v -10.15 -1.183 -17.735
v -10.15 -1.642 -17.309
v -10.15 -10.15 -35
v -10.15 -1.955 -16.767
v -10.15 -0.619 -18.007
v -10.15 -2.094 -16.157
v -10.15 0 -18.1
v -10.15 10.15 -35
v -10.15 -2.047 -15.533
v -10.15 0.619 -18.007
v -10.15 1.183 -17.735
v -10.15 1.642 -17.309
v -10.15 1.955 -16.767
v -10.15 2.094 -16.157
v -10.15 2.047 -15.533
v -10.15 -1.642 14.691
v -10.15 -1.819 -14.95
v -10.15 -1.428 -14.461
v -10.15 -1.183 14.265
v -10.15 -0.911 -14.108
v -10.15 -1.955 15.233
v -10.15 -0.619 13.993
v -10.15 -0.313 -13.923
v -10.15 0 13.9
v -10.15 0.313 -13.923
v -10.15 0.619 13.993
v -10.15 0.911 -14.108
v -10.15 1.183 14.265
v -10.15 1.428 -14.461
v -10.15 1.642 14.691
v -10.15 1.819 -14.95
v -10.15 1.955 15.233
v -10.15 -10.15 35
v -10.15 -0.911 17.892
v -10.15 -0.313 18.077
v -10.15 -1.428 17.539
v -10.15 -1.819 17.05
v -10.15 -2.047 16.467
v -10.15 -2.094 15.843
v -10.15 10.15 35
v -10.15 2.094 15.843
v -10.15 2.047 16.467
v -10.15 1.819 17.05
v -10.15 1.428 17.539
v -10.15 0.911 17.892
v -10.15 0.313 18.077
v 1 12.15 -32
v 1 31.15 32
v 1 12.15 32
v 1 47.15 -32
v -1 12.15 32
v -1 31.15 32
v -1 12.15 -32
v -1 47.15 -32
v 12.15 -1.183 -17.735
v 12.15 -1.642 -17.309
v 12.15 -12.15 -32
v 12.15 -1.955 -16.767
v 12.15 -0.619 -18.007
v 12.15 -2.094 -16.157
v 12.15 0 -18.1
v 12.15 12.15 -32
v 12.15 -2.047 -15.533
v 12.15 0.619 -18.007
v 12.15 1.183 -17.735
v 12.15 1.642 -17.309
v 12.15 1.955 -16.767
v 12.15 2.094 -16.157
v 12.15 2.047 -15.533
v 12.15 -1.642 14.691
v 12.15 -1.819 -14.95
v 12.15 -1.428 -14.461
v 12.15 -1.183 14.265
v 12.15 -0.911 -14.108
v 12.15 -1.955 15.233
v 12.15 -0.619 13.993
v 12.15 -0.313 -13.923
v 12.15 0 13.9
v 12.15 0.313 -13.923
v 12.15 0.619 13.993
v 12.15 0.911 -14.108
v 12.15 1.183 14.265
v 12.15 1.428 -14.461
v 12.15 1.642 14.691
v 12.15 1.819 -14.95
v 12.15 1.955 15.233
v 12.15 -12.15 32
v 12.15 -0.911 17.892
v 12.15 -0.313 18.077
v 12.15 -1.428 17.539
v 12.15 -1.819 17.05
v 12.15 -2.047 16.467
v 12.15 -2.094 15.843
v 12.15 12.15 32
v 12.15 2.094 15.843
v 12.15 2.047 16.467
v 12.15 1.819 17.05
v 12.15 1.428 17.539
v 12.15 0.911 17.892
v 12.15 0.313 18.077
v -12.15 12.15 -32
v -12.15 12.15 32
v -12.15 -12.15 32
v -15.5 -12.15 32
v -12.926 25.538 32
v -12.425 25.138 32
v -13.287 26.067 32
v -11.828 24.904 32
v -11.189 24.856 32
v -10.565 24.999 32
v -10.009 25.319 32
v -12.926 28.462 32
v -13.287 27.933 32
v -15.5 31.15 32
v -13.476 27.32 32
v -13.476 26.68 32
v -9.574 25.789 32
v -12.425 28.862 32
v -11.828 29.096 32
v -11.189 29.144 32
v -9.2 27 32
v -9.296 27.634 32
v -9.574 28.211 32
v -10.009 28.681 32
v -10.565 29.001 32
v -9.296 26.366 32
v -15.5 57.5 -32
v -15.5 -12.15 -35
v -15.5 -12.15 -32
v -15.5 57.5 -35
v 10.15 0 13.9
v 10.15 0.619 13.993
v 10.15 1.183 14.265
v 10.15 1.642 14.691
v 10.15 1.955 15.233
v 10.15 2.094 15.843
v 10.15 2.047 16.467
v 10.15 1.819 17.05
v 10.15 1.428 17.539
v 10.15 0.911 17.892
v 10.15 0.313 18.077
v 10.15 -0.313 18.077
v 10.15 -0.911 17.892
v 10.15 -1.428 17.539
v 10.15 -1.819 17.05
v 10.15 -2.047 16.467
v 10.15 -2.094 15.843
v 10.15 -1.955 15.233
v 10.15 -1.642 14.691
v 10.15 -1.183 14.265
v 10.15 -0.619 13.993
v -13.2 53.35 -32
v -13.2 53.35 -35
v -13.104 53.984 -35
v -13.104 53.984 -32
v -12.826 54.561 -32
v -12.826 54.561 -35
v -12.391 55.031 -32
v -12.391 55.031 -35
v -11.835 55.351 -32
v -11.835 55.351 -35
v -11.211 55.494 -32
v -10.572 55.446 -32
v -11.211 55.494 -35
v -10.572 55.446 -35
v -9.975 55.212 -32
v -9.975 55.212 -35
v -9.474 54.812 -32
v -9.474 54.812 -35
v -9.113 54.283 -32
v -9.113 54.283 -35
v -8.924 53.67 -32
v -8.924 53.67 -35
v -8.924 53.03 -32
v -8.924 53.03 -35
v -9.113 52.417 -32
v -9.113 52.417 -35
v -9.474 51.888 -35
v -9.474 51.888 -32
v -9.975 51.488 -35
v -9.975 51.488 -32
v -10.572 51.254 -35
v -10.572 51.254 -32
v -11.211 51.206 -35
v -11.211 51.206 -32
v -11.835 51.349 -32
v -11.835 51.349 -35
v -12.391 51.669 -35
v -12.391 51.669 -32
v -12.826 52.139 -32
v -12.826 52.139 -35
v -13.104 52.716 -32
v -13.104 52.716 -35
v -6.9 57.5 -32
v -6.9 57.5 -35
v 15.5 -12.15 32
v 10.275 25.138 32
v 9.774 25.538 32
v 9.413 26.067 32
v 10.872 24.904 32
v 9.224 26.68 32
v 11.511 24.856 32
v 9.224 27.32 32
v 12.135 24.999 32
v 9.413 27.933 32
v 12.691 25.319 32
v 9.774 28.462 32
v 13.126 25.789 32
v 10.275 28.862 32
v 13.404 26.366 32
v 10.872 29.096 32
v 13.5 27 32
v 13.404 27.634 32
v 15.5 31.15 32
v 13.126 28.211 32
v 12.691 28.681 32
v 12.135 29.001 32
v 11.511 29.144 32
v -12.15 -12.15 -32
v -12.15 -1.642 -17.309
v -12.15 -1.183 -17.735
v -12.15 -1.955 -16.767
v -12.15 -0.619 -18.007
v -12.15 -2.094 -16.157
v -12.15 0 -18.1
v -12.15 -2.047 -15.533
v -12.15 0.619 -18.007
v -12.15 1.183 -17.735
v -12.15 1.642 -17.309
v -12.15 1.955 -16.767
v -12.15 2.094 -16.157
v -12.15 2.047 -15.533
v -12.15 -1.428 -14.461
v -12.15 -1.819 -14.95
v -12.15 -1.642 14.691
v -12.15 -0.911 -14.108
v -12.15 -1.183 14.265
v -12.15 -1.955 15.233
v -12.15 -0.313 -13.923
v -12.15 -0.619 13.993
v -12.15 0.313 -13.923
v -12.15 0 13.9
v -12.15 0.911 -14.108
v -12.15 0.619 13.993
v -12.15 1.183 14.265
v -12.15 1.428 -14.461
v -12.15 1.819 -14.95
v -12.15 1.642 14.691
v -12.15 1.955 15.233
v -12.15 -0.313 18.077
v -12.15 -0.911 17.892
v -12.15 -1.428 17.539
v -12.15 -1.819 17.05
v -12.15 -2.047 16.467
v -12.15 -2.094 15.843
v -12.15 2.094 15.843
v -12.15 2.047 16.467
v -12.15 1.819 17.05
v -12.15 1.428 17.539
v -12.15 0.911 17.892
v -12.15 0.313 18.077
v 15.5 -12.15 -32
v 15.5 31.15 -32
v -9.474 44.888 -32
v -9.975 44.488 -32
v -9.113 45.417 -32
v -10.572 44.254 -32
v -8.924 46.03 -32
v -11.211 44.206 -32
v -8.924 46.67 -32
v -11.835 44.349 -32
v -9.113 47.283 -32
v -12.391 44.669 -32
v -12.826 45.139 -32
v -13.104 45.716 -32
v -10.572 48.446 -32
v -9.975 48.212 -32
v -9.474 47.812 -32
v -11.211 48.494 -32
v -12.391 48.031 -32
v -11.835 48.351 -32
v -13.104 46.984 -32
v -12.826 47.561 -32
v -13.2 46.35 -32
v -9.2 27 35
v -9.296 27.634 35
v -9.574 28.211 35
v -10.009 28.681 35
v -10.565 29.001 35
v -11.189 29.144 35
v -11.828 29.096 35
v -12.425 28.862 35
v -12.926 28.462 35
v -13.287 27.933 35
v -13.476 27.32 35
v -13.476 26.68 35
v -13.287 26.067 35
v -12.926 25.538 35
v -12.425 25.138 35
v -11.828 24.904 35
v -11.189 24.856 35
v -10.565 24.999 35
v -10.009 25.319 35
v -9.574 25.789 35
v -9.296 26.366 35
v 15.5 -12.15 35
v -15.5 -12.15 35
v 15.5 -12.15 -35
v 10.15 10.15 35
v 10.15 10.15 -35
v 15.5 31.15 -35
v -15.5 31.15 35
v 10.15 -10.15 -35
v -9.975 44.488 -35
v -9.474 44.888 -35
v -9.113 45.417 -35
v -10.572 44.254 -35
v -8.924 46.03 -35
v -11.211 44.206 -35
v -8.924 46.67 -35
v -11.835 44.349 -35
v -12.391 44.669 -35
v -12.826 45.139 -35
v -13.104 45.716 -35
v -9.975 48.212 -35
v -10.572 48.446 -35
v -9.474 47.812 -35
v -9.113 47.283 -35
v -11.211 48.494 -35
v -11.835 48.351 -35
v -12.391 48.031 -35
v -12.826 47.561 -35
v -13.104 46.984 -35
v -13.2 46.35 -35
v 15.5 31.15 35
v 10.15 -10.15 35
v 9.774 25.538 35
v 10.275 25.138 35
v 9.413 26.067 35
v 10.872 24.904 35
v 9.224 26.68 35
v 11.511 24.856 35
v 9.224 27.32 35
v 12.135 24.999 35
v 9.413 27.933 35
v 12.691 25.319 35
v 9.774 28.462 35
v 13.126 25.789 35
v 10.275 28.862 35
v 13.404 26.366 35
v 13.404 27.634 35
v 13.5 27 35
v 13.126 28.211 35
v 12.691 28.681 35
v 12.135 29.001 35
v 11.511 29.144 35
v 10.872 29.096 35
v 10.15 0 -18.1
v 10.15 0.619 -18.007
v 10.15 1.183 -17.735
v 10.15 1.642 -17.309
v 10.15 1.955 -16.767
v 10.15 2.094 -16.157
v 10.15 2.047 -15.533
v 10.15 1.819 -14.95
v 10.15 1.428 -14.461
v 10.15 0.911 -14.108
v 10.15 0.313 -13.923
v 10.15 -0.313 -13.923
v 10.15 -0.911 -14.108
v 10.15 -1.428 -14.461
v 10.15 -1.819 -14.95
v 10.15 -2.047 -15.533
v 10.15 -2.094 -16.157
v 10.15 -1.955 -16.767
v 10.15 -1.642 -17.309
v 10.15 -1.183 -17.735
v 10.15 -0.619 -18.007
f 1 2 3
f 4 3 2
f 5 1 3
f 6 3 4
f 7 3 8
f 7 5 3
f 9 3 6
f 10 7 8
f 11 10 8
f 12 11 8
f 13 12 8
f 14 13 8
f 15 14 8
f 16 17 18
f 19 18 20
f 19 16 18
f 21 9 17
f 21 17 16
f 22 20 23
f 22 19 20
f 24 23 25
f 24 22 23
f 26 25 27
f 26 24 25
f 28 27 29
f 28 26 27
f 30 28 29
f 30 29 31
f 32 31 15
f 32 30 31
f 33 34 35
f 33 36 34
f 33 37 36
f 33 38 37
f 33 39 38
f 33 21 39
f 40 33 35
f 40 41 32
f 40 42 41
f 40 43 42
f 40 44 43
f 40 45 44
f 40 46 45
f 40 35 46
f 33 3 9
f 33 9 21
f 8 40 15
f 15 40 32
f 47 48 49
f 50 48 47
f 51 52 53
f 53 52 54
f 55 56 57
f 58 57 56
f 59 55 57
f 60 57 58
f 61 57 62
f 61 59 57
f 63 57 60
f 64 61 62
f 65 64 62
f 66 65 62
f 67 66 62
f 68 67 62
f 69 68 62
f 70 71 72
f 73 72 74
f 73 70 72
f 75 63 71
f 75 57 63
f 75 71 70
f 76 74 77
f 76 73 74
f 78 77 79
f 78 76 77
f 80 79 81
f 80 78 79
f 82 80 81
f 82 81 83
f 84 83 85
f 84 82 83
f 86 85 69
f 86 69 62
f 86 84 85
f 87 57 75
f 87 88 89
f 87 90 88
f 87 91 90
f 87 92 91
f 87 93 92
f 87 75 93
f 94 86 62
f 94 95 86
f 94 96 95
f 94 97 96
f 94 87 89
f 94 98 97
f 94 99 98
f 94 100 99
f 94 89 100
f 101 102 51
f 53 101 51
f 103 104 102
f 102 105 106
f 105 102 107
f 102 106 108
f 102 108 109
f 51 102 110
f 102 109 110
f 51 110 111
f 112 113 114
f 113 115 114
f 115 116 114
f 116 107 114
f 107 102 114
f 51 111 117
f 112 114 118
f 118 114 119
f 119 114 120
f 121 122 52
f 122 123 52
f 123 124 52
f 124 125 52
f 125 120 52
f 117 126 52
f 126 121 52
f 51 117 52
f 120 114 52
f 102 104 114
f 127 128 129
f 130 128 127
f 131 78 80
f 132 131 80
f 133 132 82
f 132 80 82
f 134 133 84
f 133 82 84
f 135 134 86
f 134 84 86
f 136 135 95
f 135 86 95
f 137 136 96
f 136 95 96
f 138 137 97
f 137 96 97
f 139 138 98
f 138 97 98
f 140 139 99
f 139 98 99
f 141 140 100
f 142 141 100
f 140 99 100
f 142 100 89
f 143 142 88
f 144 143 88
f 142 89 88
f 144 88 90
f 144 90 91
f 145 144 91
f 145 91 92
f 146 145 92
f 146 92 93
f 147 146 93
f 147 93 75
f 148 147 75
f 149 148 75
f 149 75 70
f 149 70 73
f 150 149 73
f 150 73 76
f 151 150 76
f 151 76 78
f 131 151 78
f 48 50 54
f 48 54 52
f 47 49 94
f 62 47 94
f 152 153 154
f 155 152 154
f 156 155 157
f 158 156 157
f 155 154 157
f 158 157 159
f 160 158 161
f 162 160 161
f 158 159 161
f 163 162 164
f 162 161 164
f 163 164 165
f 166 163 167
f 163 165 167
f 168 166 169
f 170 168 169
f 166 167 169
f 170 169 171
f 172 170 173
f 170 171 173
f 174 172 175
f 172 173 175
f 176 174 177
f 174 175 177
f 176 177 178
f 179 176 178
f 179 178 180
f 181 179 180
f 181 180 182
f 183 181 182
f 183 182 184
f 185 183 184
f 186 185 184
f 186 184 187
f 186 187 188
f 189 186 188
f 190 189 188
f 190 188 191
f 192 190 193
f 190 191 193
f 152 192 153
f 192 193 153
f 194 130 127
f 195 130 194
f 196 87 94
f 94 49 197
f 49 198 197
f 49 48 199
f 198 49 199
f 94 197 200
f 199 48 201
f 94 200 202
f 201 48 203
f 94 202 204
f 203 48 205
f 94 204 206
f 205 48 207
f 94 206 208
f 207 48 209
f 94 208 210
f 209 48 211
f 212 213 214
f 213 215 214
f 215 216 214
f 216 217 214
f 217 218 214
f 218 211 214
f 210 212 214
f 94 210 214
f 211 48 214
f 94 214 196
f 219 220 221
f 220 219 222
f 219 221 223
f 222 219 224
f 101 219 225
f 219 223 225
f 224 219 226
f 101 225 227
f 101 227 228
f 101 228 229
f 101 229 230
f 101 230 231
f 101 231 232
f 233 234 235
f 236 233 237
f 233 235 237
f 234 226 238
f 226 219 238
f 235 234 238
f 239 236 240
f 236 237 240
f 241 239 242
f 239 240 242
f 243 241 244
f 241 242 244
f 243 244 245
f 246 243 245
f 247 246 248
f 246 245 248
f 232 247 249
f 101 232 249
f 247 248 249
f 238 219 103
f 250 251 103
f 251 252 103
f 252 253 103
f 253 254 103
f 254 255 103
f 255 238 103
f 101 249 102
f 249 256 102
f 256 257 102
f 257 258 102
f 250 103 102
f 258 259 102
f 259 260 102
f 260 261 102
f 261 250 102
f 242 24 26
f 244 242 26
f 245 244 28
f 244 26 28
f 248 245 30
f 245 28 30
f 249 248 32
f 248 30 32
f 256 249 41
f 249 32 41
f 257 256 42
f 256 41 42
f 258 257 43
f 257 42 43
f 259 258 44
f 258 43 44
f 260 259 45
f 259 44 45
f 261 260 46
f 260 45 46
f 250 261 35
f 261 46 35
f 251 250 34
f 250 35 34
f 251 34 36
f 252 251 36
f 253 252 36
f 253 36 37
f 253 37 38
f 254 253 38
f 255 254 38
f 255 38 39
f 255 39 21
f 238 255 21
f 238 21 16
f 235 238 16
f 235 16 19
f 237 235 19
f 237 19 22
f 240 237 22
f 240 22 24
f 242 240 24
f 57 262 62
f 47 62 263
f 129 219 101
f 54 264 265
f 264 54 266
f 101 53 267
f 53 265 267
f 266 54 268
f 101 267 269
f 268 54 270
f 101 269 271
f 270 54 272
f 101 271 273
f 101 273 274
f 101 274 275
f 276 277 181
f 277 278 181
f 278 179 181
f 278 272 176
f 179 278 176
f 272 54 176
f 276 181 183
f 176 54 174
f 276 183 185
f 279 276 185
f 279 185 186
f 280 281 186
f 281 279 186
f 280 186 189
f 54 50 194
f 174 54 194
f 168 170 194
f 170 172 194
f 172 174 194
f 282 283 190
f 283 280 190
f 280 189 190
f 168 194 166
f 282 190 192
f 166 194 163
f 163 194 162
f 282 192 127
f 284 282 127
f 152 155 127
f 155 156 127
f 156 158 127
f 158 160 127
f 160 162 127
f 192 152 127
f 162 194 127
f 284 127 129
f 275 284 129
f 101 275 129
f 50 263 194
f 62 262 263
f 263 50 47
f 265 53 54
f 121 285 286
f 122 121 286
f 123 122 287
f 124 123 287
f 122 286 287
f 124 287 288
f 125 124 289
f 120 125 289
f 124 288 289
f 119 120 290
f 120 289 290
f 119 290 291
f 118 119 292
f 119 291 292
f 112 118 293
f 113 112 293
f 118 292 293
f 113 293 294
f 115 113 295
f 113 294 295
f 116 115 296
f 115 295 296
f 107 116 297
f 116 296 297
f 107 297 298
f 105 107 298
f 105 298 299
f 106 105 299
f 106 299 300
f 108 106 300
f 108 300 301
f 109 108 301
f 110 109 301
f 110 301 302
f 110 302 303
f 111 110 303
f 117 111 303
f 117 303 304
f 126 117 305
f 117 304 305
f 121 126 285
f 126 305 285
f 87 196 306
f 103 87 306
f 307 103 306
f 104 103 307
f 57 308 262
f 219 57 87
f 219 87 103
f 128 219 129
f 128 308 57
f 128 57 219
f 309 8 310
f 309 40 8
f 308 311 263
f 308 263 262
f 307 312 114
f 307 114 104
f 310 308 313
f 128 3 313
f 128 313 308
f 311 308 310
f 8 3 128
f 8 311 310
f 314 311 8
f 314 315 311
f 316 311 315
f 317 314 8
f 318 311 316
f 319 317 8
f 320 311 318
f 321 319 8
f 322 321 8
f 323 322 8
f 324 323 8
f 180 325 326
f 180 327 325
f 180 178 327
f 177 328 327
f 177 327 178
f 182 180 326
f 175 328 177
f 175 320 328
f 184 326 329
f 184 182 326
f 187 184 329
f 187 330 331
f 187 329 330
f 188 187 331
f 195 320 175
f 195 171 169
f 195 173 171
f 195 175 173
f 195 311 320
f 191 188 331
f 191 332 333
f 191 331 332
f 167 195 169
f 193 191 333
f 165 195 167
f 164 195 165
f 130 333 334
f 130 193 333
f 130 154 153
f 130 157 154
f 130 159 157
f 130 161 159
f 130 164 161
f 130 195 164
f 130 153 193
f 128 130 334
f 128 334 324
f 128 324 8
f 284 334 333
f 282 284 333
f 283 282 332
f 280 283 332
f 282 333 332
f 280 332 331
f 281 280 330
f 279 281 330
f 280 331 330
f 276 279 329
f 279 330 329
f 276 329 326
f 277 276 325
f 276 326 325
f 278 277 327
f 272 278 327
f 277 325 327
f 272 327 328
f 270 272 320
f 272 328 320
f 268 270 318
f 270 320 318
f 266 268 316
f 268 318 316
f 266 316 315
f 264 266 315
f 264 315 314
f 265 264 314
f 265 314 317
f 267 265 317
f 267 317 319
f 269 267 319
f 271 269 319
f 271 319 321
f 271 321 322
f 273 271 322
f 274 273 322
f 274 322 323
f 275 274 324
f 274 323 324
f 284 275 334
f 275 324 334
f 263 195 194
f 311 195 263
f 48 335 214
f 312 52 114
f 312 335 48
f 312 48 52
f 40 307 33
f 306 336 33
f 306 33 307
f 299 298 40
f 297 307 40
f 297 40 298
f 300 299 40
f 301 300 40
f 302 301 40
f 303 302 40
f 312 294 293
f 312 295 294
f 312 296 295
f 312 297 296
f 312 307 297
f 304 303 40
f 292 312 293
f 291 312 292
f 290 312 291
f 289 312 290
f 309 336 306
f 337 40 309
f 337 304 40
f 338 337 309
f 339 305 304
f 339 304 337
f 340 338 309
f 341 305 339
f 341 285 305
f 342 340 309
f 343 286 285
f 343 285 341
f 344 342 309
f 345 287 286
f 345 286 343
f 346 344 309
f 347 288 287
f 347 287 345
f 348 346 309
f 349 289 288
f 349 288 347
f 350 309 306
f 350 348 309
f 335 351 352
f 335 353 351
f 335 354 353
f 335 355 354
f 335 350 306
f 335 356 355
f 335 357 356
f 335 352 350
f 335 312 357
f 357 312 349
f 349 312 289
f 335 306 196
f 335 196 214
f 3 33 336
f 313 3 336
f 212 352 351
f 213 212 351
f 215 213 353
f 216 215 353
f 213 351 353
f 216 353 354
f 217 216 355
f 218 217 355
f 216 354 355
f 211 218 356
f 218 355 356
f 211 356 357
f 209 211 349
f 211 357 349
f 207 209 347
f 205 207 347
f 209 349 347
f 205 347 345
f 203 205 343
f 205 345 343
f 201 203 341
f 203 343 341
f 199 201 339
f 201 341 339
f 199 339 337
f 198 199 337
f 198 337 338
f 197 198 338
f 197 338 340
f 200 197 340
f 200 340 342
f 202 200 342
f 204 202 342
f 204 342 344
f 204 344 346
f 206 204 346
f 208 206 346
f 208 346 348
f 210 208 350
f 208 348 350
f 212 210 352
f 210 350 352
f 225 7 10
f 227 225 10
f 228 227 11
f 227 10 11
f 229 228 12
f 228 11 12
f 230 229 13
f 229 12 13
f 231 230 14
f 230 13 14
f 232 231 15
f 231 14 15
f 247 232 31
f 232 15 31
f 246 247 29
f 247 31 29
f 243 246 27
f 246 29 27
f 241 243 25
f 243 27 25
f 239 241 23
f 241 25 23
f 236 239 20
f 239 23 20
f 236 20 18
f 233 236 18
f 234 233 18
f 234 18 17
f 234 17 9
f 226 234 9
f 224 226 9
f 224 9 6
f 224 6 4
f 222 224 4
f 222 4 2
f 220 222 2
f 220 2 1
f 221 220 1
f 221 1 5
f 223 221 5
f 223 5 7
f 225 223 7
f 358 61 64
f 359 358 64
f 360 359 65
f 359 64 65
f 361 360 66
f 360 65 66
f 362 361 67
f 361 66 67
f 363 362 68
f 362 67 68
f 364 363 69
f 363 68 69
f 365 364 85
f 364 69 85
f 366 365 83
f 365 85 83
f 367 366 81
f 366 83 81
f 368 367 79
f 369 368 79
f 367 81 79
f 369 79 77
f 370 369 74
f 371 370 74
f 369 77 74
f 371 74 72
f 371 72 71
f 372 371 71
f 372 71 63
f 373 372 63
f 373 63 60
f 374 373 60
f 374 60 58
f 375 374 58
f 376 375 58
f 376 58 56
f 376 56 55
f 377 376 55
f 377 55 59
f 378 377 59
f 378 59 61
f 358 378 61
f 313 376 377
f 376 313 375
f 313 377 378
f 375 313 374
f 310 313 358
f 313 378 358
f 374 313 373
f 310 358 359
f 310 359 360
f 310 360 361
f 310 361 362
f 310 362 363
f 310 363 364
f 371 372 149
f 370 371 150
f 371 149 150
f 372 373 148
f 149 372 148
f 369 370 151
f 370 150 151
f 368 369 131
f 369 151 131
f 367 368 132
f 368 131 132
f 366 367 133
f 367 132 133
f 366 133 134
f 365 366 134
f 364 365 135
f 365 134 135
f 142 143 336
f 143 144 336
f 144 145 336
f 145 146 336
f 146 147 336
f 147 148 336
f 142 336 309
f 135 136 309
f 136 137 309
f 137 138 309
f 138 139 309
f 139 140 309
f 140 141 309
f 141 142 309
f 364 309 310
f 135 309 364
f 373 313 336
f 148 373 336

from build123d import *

# Parameters (mm, degrees)
CROQUIS1_W              = 24.3
CROQUIS1_H              = 24.3
CROQUIS1_W_2            = 20.3
CROQUIS1_H_2            = 20.3
SALIENTE_EXTRUIR1_DEPTH = 35
CROQUIS2_R              = 2.15
SALIENTE_EXTRUIR2_DEPTH = 3
CROQUIS3_R              = 2.15
SALIENTE_EXTRUIR3_DEPTH = 3
SALIENTE_EXTRUIR4_DEPTH = 1
CROQUIS5_R              = 2.1
CORTAR_EXTRUIR1_DEPTH   = 28.65


with BuildPart() as part:
    # Croquis1 → Saliente-Extruir1 (new body, symmetric)
    with BuildSketch(Plane.XY):
        Rectangle(CROQUIS1_W, CROQUIS1_H)
        Rectangle(CROQUIS1_W_2, CROQUIS1_H_2, mode=Mode.SUBTRACT)
    extrude(amount=SALIENTE_EXTRUIR1_DEPTH, both=True)

    # Croquis2 → Saliente-Extruir2 (add)
    with BuildSketch(Plane.XY.offset(35)):
        Polygon((15.5, -12.15), (15.5, 27), (15.5, 31.15), (-15.5, 31.15), (-15.5, -12.15), (-12.15, -12.15), (-12.15, 12.15), (12.15, 12.15), (12.15, -12.15), align=None)
        with Locations((-11.35, 27)):
            Circle(CROQUIS2_R, mode=Mode.SUBTRACT)
        with Locations((11.35, 27)):
            Circle(CROQUIS2_R, mode=Mode.SUBTRACT)
    extrude(amount=-SALIENTE_EXTRUIR2_DEPTH)

    # Croquis3 → Saliente-Extruir3 (add)
    with BuildSketch(Plane(origin=(0, 0, -35), x_dir=(-1, 0, 0), z_dir=(0, 0, -1))):
        Polygon((12.15, -12.15), (15.5, -12.15), (15.5, 57.5), (6.9, 57.5), (-15.5, 31.15), (-15.5, -12.15), (-12.15, -12.15), (-12.15, 12.15), (12.15, 12.15), align=None)
        with Locations((11.05, 53.35)):
            Circle(CROQUIS3_R, mode=Mode.SUBTRACT)
        with Locations((11.05, 46.35)):
            Circle(CROQUIS3_R, mode=Mode.SUBTRACT)
    extrude(amount=-SALIENTE_EXTRUIR3_DEPTH)

    # Croquis4 → Saliente-Extruir4 (add, symmetric)
    with BuildSketch(Plane(origin=(0, 0, 0), x_dir=(0, 0, -1), z_dir=(1, 0, 0))):
        Polygon((-32, 12.15), (32, 12.15), (32, 47.15), (-32, 31.15), align=None)
    extrude(amount=SALIENTE_EXTRUIR4_DEPTH, both=True)

    # Croquis5 → Cortar-Extruir1 (cut, through all)
    with BuildSketch(Plane(origin=(12.15, 0, 0), x_dir=(0, 0, -1), z_dir=(1, 0, 0))):
        with Locations((-16, 0)):
            Circle(CROQUIS5_R)
        with Locations((16, 0)):
            Circle(CROQUIS5_R)
    extrude(amount=-CORTAR_EXTRUIR1_DEPTH, mode=Mode.SUBTRACT)


solid = part.part
